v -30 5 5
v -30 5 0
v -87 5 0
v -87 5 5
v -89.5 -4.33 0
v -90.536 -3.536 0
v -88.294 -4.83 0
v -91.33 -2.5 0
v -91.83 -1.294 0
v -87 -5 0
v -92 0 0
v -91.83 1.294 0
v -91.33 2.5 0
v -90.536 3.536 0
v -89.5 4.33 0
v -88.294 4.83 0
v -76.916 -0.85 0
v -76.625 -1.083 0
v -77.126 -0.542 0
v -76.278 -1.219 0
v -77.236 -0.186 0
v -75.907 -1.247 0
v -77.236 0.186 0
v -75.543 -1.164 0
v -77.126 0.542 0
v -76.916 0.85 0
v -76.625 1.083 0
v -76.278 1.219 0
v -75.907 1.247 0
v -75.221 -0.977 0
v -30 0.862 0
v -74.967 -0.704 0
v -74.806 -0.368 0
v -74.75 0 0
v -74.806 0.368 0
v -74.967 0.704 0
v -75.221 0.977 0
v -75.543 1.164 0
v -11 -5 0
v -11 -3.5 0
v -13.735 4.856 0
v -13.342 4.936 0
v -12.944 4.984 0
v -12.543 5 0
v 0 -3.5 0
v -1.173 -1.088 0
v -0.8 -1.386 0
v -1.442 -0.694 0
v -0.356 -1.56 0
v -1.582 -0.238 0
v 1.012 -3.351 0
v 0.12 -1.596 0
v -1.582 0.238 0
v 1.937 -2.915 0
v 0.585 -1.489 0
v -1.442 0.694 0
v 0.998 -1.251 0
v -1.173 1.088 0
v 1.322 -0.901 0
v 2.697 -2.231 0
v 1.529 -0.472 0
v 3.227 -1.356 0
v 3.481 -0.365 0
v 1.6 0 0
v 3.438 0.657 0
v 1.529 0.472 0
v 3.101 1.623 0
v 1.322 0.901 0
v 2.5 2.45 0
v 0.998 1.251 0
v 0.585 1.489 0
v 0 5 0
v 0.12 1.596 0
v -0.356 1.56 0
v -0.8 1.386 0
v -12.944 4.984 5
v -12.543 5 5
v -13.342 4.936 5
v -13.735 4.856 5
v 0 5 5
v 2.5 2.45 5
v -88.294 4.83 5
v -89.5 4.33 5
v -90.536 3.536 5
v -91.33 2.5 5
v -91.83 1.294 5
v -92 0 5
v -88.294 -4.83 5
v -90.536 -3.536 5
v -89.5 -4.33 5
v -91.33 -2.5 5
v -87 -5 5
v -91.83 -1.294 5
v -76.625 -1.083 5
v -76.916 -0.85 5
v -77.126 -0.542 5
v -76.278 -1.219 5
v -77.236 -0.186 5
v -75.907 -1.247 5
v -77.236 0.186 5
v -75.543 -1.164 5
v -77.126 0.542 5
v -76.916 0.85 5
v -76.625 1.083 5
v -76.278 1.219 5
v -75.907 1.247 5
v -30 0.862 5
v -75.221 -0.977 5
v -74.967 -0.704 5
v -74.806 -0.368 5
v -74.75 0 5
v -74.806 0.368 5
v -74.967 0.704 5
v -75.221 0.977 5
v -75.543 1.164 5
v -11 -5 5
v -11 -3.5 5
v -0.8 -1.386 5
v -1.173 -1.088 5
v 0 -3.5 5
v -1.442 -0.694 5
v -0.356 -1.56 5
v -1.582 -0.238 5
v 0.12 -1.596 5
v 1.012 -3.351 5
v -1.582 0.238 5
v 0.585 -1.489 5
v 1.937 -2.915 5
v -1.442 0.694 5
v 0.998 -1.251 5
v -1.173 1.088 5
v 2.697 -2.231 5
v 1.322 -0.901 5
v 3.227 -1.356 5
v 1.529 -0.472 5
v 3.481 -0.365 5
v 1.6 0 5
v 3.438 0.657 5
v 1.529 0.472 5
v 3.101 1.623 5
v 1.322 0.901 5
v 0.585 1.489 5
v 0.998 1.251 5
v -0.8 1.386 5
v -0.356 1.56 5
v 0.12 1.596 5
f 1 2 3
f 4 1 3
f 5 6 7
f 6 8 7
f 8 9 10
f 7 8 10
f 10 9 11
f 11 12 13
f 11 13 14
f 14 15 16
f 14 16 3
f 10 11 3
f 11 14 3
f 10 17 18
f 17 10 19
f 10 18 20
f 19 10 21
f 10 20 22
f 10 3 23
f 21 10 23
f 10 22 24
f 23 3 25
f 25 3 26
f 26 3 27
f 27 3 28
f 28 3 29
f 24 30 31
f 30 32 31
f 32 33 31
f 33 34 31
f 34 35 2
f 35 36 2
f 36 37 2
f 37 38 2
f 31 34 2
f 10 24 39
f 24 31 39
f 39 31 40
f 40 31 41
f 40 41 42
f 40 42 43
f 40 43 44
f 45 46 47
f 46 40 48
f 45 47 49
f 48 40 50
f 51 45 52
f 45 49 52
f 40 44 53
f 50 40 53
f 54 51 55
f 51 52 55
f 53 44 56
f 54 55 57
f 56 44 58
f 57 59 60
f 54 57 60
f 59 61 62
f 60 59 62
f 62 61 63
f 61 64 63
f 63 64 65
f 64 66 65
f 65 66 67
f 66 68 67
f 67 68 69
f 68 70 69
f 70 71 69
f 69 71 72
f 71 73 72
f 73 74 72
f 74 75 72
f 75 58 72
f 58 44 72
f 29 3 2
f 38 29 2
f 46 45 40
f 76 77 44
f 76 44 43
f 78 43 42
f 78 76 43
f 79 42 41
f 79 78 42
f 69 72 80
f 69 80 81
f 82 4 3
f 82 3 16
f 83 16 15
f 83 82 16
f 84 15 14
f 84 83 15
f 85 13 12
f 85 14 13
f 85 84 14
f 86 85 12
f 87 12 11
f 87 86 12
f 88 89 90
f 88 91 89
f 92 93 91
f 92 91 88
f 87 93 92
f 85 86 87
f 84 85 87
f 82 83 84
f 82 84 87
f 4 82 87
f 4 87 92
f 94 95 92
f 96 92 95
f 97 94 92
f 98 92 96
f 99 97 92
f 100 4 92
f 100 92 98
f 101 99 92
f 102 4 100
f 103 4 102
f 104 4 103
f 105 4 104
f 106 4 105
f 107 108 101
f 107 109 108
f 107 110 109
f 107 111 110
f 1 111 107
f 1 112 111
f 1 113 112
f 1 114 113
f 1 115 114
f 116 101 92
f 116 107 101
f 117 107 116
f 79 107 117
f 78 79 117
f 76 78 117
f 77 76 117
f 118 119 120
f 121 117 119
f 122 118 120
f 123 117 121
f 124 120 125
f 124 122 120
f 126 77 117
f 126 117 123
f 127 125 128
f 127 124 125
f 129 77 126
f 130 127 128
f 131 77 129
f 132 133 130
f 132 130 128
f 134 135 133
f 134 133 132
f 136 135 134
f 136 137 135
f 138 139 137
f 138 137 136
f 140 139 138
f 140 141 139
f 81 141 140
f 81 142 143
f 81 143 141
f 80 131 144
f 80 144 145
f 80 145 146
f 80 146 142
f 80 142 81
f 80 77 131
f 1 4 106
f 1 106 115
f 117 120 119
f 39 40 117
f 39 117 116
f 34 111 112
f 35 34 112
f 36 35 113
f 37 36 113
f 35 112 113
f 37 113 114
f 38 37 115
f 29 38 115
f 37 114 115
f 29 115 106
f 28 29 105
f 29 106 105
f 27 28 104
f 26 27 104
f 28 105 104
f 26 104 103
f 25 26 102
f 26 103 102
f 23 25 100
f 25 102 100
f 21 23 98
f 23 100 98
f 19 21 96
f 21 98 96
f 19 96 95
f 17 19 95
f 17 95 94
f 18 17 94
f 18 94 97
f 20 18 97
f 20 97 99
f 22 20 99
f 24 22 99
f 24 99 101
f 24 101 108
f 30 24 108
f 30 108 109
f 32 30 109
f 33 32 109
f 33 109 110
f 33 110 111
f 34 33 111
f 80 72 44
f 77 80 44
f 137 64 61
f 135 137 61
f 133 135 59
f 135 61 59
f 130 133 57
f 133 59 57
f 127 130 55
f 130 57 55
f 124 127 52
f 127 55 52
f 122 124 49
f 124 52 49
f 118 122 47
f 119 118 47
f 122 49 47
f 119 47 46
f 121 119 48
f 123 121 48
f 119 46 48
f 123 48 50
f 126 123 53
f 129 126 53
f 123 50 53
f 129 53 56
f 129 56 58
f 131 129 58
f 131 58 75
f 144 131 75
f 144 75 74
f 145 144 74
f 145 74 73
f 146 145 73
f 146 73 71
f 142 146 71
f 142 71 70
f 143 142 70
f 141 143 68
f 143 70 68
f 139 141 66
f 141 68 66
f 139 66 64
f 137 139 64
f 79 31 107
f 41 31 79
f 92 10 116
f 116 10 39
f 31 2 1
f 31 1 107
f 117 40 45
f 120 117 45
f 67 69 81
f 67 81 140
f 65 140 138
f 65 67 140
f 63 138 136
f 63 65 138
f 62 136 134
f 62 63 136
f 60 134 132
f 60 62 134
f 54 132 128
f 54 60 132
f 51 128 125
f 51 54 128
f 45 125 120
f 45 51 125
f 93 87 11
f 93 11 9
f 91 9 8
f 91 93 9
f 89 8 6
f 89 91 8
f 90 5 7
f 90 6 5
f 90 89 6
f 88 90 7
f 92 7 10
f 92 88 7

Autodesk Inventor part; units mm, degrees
ref_plane "YZ Plane" through (0, 0, 0) normal (1, 0, 0) x (0, 1, 0)
ref_plane "XZ Plane" through (0, 0, 0) normal (0, 1, 0) x (-1, 0, 0)
ref_plane "XY Plane" through (0, 0, 0) normal (0, 0, 1) x (1, 0, 0)
sketch "スケッチ1" plane through (0, 0, 0) normal (0, 0, 1) x (1, 0, 0)
  line L0 (0, 0) -> (-92, 0) construction
  line L1 (0, 5) -> (-92, 5)
  line L2 (-92, -5) -> (0, -5)
  arc A0 (0, -5) -> (0, 5) centre (0, 0) ccw
  circle A1 centre (0, 0) radius 1.6
  line L3 (-29.5, 1.5) -> (-29.5, 6.5)
  line L4 (-29.5, 1.5) -> (17.5, 13.0396)
  line L5 (17.5, 13.0396) -> (17.5, 18.1985)
  line L6 (17.5, 18.1985) -> (-29.5, 6.5)
  circle A2 centre (0, 15) radius 1.5
  line L7 (0, 15) -> (0, 0)
  circle A3 centre (0, 15) radius 2.5
  circle A4 centre (15, 15) radius 2.5
  circle A5 centre (15, 15) radius 1.5
  line L8 (-30, 6.8908) -> (-30, 0.8624)
  line L9 (-30, 0.8624) -> (18, 12.6475)
  line L10 (18, 12.6475) -> (18, 18.8382)
  line L11 (18, 18.8382) -> (-30, 6.8908)
  line L12 (-92, 5) -> (-92, -5)
  line L13 (0, 0) -> (-11, 0)
  line L14 (-11, 0) -> (-11, -3.5)
  line L15 (-11, 0) -> (-7.5, 0) construction
  line L16 (-11, -3.5) -> (0, -3.5)
  circle A6 centre (0, 0) radius 3.5
  line L17 (0, 5) -> (2.4995, 2.45)
  line L18 (-11, 0) -> (-11, -5)
  line L19 (15, 15) -> (15, 15)
  circle A7 centre (15, 15) radius 1.5
  circle A8 centre (15, 15) radius 2.5
  line L20 (-67.5, 5) -> (-67.5, -5)
  point P0 (-15.2447, 5)
  point P1 (-29.5, 5)
  point P2 (0, 12.5)
  point P3 (0.6029, 12.5738)
  point P4 (0, 8.7429)
  point P5 (2.4387, 14.4497)
  point P6 (-1.8962, 13.3707)
  point P7 (-13.1477, 5)
  point P8 (-30, 5)
  point P9 (-11, -4.9654)
  dimension "d14" = 10
  dimension "d1" = 92
  dimension "d2" = 3.2
  dimension "d3" = 5
  dimension "d4" = 3
  dimension "d5" = 15
  dimension "d6" = 1
  dimension "d11" = 15
  dimension "d16" = 0.5
  dimension "d24" = 5
  dimension "d25" = 11
  dimension "d26" = 90
  dimension "d27" = 7
  dimension "d30" = 0
  dimension "d31" = 3
  dimension "d32" = 1
  dimension "d33" = 62
  dimension "d34" = 37.5
  dimension "d46" = 92
  dimension "d47" = 3.5
extrude "押し出し1" add sketch "スケッチ1" along normal blind 5 contours L20 L2 L12 L1 | L1 L8 L9 L7 A6 L13 L14 L18 L2 L20 | L14 L13 A6 L16 | L17 A6 L7 | A6 L13 A1 L7 | L7 A1 L13 A6
fillet "フィレット1" radius 5 2 edges at (-92, 5, 2.5) (-92, -5, 2.5)
fillet "フィレット2" radius 5 1 edges at (-13.1477, 5, 2.5)
sketch "スケッチ3" plane through (0, 0, 5) normal (0, 0, 1) x (1, 0, 0)
  arc A0 (-12.5429, 5) -> (-13.7351, 4.8558) centre (-12.5429, 0) ccw projected
  line L0 (-13.7351, 4.8558) -> (-30, 0.8624) projected
  line L1 (-30, 0.8624) -> (-30, 5) projected
  line L2 (-30, 5) -> (-87, 5) projected
  arc A1 (-87, 5) -> (-87, -5) centre (-87, 0) ccw projected
  line L3 (-87, -5) -> (-11, -5) projected
  line L4 (-11, -5) -> (-11, -3.5) projected
  line L5 (-11, -3.5) -> (0, -3.5) projected
  arc A2 (0, -3.5) -> (2.4995, 2.45) centre (0, 0) ccw projected
  line L6 (2.4995, 2.45) -> (0, 5) projected
  line L7 (0, 5) -> (-12.5429, 5) projected
  circle A3 centre (0, 0) radius 1.6 projected
  circle A4 centre (-76, 0) radius 1.25
  dimension "d49" = 2.5
  dimension "d50" = 11
extrude "押し出し3" cut sketch "スケッチ3" against normal blind 10 contours A4
thread "ねじ3" size "M3x0.5" class "6H" standard "ANSI Metric M Profile" full length
properties part number "カウンター" material "ポリカーボネート、スモーク"
